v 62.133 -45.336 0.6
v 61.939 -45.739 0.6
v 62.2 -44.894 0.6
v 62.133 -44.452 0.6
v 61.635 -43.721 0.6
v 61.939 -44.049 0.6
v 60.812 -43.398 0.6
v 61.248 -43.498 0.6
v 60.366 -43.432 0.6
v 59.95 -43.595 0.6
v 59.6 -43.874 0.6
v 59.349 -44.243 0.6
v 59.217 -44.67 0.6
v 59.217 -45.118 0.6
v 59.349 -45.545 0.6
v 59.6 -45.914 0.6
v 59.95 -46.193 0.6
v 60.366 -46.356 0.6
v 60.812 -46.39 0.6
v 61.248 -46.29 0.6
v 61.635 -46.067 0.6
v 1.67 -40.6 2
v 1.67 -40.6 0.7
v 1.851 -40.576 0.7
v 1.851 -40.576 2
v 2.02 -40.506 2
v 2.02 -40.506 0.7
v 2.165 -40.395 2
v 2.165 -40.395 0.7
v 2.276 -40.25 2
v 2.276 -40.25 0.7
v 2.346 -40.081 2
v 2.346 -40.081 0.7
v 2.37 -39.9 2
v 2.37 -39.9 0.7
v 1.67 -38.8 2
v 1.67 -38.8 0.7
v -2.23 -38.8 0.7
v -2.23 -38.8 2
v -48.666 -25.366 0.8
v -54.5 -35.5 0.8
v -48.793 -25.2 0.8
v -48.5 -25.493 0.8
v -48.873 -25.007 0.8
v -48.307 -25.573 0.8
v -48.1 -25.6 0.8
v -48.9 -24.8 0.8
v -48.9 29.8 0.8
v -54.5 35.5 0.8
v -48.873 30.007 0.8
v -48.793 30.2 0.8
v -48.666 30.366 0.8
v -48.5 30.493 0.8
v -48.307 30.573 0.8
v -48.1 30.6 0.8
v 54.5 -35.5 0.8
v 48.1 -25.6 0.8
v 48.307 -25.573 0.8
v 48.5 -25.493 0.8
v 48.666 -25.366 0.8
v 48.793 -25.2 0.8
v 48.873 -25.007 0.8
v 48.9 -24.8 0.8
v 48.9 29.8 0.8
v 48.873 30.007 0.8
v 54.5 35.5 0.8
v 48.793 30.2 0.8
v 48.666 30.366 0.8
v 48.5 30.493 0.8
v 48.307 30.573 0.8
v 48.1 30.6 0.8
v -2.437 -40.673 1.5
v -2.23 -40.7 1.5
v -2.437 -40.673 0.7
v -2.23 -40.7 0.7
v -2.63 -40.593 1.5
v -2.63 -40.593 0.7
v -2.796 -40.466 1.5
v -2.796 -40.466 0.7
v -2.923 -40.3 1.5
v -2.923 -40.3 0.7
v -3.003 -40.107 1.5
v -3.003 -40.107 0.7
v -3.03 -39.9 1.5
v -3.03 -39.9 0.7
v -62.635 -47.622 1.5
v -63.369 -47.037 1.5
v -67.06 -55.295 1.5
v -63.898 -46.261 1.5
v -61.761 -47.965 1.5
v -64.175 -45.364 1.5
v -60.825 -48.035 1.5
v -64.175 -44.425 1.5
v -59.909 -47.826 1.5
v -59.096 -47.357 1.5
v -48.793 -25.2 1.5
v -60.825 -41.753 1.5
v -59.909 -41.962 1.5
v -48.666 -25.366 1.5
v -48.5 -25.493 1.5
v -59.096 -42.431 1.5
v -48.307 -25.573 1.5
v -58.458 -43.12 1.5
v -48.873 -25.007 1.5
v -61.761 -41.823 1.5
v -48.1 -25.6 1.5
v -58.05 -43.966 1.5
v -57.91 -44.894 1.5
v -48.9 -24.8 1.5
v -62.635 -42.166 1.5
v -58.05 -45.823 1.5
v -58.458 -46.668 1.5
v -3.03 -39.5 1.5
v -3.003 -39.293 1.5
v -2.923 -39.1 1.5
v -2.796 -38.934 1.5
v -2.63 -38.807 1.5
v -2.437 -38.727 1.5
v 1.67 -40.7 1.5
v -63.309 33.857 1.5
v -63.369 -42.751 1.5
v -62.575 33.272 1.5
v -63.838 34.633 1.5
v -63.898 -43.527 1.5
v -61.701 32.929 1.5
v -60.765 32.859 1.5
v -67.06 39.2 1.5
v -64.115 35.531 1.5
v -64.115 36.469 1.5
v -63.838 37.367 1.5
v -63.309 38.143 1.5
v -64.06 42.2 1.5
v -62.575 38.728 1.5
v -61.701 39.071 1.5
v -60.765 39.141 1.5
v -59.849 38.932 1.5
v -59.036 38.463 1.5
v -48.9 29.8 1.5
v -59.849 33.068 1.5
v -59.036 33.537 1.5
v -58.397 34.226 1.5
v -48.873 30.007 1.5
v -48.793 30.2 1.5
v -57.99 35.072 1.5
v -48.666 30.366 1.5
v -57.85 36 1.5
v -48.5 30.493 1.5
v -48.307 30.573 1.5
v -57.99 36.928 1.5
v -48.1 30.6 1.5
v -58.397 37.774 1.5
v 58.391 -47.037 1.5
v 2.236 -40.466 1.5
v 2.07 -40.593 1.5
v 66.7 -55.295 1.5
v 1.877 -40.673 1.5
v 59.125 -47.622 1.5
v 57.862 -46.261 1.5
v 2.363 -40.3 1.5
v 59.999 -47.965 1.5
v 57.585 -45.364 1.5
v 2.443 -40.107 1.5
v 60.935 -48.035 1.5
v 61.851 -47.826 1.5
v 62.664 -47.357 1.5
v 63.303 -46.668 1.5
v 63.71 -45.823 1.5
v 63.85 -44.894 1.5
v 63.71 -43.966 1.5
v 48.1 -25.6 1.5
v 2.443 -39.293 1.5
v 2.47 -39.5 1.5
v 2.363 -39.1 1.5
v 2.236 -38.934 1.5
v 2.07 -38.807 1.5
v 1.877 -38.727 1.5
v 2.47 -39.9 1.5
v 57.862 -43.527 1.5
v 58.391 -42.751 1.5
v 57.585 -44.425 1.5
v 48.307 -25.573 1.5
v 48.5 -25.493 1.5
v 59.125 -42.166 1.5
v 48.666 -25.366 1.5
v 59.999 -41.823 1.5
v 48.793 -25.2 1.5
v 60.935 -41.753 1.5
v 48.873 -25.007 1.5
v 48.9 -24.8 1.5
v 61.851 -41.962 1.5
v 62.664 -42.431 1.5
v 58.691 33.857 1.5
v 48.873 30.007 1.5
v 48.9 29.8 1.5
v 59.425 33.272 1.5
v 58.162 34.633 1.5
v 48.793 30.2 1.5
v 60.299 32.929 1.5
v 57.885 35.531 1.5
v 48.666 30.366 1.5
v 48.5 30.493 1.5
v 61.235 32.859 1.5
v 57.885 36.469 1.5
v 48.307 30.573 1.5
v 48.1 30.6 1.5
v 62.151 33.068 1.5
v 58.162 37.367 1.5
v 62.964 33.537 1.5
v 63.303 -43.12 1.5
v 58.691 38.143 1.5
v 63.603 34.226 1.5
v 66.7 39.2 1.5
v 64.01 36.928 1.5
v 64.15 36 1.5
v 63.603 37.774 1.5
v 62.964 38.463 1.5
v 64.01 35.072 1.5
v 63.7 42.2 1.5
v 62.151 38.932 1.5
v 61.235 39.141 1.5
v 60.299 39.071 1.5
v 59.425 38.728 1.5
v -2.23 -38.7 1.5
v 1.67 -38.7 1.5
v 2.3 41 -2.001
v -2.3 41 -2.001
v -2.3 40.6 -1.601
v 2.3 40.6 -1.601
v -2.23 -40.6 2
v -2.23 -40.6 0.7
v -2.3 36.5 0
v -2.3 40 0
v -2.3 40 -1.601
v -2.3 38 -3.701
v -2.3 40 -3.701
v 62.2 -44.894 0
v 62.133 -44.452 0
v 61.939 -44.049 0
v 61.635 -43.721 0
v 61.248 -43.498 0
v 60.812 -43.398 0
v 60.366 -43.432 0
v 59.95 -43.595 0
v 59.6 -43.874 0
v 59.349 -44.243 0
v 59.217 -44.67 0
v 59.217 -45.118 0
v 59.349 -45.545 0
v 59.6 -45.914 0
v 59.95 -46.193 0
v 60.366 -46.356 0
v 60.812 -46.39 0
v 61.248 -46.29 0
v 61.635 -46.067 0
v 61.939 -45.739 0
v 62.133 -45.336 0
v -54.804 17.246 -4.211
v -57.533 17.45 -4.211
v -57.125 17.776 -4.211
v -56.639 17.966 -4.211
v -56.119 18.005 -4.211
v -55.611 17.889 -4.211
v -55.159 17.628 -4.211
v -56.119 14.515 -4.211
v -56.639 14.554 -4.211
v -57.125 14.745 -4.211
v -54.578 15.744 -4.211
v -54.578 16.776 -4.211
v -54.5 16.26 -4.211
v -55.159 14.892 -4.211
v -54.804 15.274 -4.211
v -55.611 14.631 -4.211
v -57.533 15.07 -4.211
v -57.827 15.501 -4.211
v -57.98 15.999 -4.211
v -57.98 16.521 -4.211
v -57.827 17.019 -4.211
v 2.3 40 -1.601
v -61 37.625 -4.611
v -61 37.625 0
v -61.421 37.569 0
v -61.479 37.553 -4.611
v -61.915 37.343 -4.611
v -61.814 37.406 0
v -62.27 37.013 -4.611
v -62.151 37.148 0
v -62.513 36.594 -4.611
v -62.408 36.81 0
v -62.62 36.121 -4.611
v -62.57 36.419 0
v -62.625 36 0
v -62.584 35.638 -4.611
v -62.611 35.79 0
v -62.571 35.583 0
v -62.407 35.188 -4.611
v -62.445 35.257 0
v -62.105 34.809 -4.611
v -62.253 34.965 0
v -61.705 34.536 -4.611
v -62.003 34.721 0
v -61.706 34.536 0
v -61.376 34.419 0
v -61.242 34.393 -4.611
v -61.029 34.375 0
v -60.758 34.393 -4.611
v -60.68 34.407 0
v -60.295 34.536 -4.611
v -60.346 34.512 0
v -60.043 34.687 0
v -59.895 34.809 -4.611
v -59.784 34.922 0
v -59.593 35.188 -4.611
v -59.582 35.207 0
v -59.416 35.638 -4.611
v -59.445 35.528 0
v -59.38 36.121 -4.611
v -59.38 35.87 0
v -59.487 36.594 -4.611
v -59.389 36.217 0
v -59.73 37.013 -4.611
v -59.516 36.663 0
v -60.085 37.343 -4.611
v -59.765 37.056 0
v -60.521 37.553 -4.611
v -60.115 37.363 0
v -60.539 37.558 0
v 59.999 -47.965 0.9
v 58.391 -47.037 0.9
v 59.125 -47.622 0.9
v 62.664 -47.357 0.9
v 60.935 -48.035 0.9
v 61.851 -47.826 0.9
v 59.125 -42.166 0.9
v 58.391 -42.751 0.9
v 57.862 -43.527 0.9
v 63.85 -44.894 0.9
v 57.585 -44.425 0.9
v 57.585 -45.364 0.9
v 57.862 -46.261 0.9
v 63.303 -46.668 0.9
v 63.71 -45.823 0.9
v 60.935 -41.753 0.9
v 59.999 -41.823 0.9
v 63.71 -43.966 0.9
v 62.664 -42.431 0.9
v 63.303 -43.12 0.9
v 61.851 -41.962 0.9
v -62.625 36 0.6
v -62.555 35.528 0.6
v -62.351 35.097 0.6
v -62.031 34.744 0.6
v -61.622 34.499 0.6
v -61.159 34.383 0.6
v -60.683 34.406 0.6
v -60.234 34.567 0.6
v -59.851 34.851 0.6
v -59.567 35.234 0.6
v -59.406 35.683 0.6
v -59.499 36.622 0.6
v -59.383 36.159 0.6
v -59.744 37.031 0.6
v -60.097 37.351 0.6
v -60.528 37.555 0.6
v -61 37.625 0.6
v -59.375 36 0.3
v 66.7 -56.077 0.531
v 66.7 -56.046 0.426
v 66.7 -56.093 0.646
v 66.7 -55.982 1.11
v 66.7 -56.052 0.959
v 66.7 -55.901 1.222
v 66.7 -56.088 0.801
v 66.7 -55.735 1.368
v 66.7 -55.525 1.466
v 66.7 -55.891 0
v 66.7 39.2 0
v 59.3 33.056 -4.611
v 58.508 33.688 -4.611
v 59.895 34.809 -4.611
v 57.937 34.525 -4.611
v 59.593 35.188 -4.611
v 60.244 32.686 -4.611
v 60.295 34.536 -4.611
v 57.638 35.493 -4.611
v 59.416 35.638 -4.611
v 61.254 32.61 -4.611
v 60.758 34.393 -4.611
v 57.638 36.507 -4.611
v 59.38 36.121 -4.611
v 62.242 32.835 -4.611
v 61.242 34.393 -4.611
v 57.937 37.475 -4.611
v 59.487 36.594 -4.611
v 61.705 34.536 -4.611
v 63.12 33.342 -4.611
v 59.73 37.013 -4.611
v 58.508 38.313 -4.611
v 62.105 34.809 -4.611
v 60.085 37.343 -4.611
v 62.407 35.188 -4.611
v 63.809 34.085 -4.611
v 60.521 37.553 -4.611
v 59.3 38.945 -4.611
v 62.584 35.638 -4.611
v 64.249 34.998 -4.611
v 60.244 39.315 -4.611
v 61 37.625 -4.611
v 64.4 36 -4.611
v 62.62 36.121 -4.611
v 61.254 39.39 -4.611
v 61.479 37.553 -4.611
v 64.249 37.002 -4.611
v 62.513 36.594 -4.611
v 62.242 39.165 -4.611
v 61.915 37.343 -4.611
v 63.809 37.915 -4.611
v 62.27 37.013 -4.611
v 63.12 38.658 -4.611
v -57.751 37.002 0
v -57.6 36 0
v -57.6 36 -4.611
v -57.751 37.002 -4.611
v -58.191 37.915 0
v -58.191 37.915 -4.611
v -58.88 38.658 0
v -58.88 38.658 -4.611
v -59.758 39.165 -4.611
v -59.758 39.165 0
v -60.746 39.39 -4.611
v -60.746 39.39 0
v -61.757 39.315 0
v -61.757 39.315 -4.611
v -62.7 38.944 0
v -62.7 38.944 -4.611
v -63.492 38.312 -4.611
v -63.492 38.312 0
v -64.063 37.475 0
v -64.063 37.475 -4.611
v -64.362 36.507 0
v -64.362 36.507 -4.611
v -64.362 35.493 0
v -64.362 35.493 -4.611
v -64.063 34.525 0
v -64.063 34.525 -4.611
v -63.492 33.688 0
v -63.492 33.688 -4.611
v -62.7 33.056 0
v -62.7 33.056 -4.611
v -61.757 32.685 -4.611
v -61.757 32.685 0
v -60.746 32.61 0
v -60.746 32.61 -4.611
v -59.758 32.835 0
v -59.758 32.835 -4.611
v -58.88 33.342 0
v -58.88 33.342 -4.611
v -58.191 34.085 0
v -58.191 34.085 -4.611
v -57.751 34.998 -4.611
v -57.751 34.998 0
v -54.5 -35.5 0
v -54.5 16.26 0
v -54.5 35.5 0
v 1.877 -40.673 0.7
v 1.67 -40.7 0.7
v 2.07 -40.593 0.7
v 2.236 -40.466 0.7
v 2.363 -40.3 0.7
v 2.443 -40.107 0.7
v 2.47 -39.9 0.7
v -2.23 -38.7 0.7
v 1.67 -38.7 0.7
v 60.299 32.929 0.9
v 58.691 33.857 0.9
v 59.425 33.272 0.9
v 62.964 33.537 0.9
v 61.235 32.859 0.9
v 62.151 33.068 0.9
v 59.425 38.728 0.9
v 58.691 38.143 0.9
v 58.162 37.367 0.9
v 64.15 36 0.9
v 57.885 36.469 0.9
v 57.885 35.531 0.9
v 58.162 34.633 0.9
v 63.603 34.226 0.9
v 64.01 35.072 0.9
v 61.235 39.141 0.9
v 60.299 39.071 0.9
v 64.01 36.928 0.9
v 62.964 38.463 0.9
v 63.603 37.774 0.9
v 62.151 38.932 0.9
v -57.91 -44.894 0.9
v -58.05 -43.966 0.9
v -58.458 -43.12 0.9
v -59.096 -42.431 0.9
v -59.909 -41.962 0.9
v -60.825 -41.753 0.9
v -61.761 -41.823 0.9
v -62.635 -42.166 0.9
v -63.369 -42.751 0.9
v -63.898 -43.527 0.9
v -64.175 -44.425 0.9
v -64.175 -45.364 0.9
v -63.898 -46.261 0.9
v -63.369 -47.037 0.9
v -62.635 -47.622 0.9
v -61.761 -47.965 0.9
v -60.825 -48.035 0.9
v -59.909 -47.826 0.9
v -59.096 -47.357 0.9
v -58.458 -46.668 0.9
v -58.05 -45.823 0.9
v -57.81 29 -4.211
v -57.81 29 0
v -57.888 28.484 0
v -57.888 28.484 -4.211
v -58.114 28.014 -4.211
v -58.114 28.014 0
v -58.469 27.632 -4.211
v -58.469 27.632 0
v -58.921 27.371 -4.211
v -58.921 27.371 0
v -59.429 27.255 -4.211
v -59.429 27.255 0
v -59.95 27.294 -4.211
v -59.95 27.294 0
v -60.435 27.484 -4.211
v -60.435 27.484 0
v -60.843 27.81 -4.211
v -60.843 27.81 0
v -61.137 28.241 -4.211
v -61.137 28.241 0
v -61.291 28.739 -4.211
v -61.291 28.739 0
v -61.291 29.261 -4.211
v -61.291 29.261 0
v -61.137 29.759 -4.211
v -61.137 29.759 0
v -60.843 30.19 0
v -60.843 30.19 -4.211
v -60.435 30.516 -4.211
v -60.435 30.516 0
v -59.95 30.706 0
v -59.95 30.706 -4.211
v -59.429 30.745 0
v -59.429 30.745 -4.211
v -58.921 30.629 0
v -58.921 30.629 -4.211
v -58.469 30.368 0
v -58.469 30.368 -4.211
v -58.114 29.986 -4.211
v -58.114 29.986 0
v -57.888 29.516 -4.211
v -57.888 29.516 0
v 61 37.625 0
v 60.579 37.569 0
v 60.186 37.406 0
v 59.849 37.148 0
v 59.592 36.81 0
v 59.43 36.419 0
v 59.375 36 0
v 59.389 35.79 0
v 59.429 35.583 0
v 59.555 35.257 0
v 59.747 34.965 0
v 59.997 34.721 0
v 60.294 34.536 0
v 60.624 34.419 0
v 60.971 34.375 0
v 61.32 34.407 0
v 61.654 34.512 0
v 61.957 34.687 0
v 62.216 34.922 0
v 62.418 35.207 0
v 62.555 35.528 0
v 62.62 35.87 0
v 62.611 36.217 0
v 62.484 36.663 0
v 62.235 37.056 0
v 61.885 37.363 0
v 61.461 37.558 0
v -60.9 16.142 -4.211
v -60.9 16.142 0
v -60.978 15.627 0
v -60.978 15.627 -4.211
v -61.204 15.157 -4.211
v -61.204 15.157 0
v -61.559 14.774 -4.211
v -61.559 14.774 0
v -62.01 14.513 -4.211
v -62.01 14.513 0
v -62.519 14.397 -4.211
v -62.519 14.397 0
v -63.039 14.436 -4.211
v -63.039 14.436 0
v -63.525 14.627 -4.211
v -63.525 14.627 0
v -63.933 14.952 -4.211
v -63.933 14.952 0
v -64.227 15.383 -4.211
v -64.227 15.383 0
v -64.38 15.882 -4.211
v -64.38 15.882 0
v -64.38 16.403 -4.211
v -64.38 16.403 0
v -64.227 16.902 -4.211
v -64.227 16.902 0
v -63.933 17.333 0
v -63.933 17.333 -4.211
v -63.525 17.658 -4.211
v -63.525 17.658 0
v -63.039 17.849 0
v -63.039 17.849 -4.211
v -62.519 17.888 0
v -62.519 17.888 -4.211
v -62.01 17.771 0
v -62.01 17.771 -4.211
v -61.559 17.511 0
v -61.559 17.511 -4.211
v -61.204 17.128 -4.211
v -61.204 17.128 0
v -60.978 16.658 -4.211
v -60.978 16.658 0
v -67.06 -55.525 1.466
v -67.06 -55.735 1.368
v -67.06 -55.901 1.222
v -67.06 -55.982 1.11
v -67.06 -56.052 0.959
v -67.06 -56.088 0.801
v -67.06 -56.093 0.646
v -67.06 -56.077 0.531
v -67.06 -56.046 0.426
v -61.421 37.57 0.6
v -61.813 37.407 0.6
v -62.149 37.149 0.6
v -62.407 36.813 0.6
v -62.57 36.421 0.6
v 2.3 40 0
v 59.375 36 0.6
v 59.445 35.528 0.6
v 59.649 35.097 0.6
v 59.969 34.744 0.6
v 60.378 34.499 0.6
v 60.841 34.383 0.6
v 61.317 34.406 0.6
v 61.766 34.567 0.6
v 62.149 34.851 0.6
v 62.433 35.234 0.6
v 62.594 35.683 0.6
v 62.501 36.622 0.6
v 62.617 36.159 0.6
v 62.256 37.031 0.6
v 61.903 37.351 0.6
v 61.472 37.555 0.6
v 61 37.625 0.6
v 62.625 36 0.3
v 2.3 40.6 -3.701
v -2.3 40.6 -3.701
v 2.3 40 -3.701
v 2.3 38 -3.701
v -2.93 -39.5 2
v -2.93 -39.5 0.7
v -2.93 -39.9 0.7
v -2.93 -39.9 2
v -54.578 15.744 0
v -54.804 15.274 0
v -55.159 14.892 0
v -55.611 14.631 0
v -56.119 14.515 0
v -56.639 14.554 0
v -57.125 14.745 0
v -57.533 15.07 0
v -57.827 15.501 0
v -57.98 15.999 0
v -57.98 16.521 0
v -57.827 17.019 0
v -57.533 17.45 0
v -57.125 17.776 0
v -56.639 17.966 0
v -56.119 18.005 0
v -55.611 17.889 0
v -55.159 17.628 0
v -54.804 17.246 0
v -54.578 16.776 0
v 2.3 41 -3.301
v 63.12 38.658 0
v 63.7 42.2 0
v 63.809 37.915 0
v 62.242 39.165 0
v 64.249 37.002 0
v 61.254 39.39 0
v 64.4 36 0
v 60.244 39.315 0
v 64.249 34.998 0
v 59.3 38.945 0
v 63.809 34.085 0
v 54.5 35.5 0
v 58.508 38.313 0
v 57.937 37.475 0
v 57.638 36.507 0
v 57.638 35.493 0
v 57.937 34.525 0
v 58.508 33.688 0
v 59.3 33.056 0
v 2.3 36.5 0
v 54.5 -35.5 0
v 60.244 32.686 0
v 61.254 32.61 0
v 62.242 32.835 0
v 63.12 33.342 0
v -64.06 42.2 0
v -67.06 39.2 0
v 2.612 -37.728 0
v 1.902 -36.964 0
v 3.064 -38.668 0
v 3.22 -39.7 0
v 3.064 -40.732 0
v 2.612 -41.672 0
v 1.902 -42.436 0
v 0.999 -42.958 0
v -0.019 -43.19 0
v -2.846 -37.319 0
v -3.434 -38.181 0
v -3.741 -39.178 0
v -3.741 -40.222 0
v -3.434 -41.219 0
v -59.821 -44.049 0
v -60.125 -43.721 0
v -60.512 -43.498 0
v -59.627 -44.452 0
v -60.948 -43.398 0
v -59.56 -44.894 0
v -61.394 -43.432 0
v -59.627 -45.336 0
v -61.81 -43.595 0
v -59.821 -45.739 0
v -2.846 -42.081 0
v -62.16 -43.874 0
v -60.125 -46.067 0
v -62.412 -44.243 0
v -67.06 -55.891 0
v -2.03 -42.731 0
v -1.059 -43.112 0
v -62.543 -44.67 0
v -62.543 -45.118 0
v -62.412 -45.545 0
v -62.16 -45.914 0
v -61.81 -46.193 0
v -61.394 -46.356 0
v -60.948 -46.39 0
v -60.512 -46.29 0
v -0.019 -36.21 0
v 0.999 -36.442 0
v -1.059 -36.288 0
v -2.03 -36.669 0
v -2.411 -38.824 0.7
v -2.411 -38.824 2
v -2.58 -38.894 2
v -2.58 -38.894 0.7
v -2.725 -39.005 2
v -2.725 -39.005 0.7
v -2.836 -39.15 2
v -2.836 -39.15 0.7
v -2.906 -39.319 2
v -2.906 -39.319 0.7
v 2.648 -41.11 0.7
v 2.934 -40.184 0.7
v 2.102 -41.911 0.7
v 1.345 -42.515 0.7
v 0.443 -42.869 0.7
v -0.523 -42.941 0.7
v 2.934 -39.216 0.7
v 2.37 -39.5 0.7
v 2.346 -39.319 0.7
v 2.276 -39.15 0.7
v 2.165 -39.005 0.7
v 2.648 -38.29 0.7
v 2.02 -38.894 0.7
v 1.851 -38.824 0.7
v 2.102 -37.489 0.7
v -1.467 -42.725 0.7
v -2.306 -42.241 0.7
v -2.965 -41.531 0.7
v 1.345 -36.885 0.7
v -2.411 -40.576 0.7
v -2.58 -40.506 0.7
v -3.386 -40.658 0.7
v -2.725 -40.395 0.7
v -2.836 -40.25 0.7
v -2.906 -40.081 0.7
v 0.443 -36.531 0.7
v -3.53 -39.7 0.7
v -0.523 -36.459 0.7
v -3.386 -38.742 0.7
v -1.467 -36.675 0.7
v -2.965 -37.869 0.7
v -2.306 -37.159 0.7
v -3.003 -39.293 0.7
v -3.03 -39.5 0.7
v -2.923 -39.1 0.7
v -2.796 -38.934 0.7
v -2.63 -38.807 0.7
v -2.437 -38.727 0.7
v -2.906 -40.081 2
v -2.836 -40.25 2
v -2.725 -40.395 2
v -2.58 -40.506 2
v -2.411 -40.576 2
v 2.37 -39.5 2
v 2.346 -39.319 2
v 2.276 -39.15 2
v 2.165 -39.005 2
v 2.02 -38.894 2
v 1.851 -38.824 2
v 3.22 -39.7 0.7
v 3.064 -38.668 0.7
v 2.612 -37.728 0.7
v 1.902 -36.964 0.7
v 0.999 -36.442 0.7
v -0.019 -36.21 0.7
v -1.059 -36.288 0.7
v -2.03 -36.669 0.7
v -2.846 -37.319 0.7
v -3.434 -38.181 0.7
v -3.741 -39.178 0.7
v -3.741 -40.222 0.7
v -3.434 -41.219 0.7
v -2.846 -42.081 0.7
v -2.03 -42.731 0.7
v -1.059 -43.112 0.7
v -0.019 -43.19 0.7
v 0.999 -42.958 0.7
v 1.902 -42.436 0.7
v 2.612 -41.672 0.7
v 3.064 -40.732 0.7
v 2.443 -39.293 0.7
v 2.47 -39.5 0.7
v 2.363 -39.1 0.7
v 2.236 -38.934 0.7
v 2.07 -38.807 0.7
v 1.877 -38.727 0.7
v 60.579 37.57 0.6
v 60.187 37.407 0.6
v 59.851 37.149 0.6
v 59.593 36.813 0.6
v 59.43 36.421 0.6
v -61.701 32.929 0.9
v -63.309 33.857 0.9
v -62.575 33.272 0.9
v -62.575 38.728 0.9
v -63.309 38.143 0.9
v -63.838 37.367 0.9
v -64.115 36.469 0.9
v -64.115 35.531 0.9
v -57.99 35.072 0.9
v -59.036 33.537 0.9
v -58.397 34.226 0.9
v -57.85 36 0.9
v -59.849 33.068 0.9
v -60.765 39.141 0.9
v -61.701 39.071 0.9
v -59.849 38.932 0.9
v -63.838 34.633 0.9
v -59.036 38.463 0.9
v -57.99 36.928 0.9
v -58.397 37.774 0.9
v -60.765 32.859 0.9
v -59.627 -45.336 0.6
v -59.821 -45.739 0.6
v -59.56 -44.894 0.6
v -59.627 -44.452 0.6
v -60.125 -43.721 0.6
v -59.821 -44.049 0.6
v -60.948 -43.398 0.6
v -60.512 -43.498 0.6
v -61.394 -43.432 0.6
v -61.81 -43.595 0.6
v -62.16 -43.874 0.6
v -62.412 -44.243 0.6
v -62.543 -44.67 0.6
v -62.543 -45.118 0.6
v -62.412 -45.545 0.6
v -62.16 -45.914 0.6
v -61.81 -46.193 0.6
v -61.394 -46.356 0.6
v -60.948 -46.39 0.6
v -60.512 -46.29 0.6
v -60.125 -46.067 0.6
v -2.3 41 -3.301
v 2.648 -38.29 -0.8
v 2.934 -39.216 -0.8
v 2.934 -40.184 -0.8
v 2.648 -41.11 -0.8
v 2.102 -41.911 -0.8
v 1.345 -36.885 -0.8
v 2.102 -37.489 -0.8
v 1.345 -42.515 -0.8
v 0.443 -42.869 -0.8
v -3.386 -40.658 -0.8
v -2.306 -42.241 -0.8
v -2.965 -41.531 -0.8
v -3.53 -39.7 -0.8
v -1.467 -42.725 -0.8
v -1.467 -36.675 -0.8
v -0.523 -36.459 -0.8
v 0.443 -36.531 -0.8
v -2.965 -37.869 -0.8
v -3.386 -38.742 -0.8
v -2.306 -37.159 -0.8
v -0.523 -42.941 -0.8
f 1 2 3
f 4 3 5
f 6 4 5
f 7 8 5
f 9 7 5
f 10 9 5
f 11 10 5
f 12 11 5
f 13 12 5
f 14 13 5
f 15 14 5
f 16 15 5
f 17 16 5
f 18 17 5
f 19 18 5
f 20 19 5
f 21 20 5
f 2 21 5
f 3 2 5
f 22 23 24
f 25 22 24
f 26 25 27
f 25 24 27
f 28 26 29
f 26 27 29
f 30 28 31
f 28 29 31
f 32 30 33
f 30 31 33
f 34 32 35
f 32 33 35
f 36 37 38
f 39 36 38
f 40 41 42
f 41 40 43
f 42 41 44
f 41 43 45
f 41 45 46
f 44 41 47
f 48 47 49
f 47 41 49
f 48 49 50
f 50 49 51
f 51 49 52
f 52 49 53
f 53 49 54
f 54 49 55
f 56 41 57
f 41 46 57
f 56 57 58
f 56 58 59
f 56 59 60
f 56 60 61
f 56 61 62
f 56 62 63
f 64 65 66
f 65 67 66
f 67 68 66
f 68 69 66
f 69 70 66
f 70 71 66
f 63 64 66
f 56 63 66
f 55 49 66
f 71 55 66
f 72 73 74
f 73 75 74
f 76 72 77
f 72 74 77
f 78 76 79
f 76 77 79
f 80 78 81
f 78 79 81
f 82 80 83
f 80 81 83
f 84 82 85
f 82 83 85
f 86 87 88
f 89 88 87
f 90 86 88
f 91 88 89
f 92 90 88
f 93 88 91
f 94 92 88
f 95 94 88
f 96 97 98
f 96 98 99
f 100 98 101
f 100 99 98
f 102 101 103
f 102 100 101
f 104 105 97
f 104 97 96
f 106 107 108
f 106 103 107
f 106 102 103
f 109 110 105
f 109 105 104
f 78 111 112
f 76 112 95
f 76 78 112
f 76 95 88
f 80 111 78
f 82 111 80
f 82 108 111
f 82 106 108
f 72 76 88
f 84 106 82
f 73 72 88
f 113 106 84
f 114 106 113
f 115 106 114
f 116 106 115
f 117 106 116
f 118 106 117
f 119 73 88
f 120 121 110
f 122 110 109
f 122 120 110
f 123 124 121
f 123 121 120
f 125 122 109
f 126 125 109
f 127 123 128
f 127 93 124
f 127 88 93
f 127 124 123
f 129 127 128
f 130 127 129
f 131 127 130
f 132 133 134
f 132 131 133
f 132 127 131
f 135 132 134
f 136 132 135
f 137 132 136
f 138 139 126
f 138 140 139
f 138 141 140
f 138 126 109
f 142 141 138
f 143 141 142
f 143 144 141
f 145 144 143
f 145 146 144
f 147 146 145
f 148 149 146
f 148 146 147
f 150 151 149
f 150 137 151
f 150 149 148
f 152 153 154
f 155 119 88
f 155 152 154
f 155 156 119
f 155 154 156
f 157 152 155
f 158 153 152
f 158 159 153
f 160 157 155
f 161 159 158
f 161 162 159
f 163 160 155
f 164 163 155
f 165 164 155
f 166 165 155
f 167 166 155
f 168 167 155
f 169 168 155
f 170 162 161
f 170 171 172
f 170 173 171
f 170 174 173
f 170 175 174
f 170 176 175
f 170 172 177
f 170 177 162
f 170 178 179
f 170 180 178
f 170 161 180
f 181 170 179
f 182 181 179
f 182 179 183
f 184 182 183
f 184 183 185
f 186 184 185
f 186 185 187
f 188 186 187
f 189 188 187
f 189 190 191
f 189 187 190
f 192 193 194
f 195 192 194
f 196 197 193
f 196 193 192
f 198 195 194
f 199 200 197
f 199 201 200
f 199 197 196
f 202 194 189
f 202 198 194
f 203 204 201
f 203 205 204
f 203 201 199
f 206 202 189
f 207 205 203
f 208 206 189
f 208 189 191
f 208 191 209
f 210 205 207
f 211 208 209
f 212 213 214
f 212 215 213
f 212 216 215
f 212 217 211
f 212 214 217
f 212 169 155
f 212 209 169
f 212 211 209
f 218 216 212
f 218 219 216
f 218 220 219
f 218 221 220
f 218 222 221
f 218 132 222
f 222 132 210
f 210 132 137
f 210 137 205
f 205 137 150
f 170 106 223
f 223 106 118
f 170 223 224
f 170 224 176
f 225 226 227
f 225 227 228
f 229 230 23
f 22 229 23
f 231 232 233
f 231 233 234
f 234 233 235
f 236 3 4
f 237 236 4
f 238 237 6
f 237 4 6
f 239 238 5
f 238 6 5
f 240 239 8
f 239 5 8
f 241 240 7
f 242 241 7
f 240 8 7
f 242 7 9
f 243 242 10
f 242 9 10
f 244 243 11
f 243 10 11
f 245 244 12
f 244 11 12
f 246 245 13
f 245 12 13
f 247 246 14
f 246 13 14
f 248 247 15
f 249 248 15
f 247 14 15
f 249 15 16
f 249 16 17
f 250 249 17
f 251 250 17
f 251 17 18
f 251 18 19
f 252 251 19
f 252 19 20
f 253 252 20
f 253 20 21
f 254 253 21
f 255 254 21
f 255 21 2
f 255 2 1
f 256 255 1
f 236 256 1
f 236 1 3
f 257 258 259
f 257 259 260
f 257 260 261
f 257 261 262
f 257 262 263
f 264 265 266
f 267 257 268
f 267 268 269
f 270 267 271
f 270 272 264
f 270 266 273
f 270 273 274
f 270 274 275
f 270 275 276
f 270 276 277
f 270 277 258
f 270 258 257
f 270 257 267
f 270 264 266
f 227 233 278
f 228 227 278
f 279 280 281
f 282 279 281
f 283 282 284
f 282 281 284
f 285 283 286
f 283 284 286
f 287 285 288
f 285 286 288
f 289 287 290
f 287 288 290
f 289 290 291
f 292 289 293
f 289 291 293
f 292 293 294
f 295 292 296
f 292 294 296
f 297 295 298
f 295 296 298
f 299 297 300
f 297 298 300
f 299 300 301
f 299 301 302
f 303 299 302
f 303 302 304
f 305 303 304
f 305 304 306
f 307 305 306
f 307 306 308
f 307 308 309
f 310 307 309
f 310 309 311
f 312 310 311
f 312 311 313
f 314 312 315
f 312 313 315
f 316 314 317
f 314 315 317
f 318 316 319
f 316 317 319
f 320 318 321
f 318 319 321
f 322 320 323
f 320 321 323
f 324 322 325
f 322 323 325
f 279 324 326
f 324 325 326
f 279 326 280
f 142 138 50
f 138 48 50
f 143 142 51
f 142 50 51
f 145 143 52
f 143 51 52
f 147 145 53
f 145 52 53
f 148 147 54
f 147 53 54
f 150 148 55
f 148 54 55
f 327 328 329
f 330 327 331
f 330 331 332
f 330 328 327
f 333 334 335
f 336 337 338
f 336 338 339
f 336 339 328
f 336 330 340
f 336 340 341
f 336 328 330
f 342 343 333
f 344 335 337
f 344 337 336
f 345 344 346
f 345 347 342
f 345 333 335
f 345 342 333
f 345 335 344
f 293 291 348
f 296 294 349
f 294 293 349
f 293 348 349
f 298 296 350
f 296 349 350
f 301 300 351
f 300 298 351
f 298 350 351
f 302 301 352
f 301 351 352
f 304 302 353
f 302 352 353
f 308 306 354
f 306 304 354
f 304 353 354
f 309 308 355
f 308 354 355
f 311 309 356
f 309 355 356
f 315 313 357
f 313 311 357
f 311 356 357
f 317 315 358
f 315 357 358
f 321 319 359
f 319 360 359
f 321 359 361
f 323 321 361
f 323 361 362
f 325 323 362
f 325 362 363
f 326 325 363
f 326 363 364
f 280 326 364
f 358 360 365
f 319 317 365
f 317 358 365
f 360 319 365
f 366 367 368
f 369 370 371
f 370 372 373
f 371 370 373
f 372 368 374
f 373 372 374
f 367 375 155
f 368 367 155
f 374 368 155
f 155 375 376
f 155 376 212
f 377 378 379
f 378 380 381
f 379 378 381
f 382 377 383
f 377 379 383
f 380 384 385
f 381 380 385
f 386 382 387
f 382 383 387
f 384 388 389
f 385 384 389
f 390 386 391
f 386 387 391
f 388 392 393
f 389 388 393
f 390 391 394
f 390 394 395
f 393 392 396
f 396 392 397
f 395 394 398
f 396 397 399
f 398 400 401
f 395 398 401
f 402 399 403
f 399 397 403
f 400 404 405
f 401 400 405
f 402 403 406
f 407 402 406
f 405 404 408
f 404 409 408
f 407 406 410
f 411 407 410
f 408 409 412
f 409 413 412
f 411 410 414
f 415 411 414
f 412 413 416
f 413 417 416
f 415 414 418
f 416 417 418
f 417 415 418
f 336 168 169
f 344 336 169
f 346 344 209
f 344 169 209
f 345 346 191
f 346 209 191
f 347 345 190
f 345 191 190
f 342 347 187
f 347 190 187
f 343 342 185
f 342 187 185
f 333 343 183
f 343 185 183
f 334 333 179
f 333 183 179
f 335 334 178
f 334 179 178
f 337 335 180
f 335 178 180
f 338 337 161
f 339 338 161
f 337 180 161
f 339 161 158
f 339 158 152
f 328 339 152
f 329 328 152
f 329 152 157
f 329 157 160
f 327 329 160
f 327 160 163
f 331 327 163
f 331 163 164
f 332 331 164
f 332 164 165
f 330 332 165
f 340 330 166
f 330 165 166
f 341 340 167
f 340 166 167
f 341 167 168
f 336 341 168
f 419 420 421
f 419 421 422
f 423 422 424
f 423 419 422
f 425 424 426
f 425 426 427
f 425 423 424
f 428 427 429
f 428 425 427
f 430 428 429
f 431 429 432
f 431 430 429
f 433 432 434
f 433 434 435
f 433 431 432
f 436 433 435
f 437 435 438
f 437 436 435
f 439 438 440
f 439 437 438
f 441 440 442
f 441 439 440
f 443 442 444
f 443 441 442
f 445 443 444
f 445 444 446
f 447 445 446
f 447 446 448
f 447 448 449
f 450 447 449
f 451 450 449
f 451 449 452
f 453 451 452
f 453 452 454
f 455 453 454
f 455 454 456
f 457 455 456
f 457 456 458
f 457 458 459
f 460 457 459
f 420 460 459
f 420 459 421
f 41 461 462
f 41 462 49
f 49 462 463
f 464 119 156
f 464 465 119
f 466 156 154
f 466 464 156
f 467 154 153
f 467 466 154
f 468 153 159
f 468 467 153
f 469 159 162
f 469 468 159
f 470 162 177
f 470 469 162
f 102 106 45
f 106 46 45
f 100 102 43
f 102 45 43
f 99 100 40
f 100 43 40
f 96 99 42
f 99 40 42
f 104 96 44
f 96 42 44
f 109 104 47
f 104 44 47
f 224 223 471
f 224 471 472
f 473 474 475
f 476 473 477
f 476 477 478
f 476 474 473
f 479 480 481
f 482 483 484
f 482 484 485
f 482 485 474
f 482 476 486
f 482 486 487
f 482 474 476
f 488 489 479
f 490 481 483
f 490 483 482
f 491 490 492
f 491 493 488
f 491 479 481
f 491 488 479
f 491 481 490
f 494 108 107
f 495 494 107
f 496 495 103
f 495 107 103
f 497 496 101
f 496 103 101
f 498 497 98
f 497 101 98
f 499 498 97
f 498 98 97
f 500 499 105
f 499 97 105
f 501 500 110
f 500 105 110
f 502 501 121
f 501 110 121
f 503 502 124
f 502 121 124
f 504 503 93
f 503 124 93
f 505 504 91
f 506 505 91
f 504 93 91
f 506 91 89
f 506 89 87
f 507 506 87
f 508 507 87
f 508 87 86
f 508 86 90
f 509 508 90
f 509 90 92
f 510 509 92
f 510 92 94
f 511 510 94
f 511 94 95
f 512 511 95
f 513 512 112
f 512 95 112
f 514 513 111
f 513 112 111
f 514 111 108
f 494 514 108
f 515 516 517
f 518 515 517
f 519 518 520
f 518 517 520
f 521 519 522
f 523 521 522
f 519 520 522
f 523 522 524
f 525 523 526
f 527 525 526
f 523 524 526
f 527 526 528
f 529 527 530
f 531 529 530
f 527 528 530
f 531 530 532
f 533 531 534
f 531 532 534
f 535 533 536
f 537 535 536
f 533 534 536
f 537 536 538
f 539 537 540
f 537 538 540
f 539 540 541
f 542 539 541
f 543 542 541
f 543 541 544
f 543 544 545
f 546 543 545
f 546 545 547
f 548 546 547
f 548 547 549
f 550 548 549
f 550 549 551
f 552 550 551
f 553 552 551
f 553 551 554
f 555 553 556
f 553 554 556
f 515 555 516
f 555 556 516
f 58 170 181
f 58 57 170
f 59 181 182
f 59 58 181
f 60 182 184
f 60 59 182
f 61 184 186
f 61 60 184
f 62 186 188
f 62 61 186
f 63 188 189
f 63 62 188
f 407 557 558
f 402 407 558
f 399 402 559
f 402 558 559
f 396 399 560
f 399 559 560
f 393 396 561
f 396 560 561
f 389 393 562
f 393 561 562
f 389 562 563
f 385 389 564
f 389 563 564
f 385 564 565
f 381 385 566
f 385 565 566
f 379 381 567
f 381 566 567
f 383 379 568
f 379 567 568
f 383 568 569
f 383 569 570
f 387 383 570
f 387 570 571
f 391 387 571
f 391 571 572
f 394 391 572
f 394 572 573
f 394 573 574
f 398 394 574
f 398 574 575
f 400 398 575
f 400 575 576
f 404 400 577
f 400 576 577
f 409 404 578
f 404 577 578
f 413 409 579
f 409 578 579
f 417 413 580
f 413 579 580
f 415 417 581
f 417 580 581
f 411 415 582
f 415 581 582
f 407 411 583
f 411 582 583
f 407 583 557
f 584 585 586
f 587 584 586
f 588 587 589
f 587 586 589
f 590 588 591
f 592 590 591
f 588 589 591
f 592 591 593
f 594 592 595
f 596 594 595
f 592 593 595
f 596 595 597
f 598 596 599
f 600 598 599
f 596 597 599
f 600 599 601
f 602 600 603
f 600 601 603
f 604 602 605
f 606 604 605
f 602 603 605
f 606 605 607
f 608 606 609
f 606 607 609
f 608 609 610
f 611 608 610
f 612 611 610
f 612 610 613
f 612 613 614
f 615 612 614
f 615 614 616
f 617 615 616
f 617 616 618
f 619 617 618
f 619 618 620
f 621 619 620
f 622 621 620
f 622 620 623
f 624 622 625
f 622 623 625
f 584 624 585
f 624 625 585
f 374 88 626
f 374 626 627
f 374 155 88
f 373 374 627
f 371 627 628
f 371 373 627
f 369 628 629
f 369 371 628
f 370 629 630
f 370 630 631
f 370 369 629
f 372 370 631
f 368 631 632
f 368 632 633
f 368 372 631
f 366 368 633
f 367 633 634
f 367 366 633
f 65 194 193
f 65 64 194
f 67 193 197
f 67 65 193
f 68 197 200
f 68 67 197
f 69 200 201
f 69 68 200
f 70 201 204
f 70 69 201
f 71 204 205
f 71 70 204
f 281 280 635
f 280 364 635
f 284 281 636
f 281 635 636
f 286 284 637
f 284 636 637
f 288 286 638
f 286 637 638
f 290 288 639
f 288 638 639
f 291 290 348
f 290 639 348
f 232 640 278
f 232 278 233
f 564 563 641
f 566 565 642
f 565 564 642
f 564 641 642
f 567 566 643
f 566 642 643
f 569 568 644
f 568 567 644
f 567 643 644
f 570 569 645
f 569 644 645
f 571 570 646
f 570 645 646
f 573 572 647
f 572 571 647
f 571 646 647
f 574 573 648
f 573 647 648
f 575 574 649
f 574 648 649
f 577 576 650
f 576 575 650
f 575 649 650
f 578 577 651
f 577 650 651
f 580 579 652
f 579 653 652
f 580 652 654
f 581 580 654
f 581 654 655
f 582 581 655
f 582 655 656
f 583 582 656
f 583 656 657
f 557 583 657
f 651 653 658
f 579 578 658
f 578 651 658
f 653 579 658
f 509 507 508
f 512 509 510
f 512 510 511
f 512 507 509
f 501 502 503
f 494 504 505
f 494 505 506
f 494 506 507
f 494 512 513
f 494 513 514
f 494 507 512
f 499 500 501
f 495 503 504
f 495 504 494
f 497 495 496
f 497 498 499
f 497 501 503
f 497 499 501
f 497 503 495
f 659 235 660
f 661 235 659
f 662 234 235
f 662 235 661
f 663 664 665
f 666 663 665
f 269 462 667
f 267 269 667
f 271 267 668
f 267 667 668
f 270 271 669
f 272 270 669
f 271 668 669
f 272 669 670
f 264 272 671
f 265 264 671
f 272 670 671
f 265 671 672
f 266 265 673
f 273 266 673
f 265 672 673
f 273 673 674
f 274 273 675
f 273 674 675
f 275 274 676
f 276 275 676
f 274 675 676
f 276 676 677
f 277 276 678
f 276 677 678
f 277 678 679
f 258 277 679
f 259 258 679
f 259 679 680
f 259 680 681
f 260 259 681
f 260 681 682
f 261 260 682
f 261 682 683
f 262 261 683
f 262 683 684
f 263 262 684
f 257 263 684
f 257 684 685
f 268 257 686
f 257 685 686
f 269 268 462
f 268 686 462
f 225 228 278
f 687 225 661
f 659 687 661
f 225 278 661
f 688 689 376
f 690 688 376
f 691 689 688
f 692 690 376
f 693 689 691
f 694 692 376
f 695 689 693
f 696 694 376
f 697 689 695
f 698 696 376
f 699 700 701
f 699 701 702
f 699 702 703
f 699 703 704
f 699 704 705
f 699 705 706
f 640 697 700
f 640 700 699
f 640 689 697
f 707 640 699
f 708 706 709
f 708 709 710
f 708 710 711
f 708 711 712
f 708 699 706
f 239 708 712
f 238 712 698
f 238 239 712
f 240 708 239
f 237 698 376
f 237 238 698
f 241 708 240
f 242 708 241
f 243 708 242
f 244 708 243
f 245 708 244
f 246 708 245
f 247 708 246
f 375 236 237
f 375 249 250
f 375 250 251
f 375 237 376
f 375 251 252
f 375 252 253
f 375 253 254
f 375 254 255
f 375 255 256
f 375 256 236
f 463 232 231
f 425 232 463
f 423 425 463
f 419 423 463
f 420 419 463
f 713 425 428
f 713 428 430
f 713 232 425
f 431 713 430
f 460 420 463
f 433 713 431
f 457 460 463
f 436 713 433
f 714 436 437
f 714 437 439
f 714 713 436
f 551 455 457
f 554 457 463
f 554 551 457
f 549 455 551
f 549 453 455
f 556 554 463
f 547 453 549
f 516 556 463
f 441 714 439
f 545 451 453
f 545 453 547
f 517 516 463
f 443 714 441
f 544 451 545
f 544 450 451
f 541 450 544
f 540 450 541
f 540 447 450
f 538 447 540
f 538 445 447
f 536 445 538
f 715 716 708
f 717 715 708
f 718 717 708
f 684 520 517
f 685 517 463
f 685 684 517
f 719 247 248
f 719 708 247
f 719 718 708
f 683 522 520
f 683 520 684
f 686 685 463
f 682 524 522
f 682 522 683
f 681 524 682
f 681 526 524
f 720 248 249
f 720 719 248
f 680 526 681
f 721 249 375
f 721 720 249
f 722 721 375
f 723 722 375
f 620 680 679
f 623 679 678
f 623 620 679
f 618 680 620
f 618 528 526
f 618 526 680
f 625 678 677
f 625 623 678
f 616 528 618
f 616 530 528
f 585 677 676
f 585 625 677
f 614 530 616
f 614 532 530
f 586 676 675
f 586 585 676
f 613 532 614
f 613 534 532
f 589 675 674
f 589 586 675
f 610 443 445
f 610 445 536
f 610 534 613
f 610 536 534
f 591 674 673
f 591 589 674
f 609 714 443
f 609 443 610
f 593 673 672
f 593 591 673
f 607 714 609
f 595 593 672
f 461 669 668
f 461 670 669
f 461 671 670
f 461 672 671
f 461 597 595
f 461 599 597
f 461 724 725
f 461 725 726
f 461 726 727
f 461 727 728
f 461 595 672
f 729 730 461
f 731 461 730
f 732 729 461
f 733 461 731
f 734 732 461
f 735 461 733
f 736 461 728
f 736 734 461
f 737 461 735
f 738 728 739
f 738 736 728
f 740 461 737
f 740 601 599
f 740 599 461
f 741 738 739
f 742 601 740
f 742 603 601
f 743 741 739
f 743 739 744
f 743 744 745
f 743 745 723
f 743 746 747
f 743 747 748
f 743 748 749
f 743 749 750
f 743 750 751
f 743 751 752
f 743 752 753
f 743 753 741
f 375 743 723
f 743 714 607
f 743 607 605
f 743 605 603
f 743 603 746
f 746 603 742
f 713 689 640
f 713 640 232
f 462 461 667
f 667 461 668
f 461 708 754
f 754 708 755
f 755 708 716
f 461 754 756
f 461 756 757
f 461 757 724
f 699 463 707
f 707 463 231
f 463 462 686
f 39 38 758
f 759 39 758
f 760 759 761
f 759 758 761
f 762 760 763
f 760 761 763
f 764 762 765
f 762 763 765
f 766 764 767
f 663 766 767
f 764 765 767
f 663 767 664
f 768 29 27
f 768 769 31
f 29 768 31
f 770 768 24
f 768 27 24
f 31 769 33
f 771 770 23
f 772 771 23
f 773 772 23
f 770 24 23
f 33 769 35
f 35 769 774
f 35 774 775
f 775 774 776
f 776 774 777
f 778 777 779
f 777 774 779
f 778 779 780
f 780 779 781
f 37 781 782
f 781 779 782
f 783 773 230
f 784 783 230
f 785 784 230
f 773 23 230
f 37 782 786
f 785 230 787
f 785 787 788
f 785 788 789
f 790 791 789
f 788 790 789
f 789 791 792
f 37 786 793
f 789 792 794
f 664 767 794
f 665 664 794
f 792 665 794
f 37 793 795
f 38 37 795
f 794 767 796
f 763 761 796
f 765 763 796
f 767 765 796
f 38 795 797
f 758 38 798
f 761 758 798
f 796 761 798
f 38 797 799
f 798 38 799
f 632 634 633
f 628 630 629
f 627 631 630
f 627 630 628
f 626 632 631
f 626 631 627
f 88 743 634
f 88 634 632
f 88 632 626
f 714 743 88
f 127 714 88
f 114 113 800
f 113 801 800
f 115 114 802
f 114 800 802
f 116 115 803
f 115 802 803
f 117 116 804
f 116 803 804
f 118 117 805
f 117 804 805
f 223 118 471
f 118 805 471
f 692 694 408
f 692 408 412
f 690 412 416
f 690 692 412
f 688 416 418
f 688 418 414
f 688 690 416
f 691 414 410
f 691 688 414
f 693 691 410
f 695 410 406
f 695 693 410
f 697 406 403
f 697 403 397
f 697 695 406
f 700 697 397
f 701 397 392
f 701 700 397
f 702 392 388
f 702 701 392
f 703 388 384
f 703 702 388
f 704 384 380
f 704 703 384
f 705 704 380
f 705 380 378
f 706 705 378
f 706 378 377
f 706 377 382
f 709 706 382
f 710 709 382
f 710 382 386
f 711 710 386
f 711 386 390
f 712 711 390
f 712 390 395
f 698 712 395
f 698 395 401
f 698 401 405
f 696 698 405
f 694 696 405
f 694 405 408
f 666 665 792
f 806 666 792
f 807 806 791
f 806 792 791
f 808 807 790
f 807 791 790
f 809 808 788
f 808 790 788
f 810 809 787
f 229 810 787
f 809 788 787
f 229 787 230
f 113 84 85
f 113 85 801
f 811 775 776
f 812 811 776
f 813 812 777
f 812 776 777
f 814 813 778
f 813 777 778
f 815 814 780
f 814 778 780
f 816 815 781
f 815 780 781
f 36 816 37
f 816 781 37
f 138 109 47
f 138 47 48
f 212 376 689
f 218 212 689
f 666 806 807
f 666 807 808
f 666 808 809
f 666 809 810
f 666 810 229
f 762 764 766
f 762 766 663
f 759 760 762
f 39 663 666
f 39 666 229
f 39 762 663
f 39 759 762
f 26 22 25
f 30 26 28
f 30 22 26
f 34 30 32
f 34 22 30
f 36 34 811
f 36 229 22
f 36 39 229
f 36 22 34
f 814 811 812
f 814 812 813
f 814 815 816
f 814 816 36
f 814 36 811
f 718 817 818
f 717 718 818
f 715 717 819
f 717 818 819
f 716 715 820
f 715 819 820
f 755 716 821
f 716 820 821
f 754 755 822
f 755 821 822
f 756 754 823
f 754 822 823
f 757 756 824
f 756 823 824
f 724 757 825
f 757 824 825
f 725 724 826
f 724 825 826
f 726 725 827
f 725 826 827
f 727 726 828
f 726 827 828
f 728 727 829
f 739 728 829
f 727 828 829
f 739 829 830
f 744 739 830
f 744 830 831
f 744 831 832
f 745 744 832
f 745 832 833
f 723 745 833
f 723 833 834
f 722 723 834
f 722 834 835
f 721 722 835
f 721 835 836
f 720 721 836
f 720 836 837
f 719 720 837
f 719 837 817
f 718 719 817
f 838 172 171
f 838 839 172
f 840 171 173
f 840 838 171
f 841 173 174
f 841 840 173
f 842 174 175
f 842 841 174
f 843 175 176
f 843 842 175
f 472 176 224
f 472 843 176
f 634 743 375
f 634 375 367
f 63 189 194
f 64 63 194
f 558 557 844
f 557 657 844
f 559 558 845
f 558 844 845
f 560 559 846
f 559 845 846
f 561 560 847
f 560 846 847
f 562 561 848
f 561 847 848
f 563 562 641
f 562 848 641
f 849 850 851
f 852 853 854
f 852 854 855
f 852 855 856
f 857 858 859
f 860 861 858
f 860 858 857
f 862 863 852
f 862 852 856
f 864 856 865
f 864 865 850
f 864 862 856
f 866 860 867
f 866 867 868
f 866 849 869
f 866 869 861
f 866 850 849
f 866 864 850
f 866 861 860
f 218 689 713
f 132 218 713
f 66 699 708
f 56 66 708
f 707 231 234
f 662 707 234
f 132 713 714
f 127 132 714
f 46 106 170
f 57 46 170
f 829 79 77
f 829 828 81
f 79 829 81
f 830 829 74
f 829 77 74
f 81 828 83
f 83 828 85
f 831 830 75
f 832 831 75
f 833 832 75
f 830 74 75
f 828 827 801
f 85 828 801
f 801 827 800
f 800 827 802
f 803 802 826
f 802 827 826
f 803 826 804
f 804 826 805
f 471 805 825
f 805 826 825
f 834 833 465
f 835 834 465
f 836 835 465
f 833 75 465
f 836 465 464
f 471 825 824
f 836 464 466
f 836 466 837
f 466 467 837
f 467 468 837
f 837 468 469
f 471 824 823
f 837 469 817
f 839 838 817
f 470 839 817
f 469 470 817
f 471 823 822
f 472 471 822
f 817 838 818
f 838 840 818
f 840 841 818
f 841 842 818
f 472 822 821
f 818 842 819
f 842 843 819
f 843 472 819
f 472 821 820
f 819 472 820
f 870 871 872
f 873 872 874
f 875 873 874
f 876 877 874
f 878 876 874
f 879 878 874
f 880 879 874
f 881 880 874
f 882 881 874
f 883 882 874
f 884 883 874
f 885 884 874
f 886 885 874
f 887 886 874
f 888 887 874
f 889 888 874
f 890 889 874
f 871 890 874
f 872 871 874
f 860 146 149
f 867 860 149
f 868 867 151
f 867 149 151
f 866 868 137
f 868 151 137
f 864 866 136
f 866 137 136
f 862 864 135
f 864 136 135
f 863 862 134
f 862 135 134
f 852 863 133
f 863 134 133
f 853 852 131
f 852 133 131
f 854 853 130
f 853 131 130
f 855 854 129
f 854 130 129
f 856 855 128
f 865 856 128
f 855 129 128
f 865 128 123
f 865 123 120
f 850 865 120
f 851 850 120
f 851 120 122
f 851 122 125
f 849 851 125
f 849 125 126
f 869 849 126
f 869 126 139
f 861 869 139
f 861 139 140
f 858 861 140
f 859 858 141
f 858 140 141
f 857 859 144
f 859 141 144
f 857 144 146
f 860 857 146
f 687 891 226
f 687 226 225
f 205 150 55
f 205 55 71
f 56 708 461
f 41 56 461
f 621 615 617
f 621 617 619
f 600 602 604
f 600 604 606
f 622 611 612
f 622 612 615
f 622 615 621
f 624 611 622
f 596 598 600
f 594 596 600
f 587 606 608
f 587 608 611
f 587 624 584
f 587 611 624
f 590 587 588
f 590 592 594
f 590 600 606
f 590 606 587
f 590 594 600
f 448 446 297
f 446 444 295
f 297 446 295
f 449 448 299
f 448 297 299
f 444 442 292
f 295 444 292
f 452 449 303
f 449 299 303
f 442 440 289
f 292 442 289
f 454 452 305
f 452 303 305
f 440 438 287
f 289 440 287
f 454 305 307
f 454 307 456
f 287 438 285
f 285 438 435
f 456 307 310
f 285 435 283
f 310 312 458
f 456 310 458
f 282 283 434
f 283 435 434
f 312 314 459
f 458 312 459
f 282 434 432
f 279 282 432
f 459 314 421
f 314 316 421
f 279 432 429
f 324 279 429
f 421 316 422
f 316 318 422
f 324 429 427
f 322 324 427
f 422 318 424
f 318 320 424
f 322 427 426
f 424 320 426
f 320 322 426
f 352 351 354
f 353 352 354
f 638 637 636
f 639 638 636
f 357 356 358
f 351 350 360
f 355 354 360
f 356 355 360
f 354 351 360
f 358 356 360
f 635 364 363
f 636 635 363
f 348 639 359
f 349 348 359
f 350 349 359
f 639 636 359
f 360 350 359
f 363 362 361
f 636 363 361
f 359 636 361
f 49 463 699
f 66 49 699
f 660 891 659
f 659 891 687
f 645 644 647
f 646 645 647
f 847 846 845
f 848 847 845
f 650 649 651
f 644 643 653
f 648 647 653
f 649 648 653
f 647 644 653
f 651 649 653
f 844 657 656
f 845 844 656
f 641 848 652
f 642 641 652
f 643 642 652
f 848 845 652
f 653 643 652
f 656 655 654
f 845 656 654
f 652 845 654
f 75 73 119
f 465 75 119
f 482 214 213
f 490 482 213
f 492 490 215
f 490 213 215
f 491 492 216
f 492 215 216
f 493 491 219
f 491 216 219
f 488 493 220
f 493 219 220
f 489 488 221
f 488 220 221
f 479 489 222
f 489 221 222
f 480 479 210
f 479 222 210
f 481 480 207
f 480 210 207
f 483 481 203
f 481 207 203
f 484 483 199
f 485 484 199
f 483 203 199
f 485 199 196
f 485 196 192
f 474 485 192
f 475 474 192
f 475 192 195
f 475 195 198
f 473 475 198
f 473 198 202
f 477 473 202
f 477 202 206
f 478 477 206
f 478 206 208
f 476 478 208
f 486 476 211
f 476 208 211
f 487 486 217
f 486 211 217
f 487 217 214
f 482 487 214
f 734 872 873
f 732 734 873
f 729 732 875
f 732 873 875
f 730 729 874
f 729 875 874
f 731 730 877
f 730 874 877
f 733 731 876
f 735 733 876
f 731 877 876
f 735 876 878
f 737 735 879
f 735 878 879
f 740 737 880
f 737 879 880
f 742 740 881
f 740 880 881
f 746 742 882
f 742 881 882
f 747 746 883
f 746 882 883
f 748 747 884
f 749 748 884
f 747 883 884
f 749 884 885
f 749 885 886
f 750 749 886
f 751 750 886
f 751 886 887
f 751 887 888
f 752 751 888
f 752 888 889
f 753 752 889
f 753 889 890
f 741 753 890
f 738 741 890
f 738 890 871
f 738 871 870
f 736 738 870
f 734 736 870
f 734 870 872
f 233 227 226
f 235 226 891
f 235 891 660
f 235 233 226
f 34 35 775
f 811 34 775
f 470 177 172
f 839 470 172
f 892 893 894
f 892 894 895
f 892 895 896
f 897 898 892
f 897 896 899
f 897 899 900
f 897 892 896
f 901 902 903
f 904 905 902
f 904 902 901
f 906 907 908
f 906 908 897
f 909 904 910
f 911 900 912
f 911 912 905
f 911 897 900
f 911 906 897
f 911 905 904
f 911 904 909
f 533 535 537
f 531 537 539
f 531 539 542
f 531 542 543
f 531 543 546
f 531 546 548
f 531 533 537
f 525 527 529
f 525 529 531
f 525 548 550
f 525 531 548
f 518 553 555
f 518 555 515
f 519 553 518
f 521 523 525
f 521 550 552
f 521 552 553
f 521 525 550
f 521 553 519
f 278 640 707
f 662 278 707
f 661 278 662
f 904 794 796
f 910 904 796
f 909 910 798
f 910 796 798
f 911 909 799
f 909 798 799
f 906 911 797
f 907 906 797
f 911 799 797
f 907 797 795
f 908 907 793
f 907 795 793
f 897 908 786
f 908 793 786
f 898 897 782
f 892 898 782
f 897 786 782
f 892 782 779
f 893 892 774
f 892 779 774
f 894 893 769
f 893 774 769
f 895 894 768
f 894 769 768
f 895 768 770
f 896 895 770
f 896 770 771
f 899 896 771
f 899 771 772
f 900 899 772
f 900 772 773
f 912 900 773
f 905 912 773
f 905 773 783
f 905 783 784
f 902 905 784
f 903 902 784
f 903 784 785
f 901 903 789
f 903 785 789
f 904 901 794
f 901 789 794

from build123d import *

# Parameters (mm, degrees)
SKETCH1_W            = 99
SKETCH1_H            = 59
BOSS_EXTRUDE1_DEPTH  = 1.5
BOSS_EXTRUDE2_DEPTH  = 133.760231922
CUT_EXTRUDE1_DEPTH   = 0.8
SKETCH4_R            = 1.5
CUT_EXTRUDE2_DEPTH   = 2
SKETCH5_R            = 3.399812147
SKETCH5_R_2          = 1.62500056
BOSS_EXTRUDE3_DEPTH  = 6.111397409
SKETCH6_R            = 3.5
CUT_EXTRUDE5_DEPTH   = 10
SKETCH7_R            = 3.5
SKETCH7_W            = 5.5
SKETCH7_H            = 2
BOSS_EXTRUDE4_DEPTH  = 0.8
FILLET1_R            = 0.8
SKETCH8_R            = 3.25
BOSS_EXTRUDE5_DEPTH  = 1.5
BOSS_EXTRUDE6_DEPTH  = 1.3
SKETCH10_R           = 3.15
CUT_EXTRUDE6_DEPTH   = 0.6
SKETCH11_R           = 1.75
BOSS_EXTRUDE7_DEPTH  = 4.211398277
SKETCH12_R           = 1.62500056
SKETCH12_R_2         = 1.5
BOSS_EXTRUDE8_DEPTH  = 0.3
SKETCH13_W           = 99
SKETCH13_H           = 59
SKETCH13_W_2         = 97.8
SKETCH13_H_2         = 56.2
BOSS_EXTRUDE9_DEPTH  = 0.7
FILLET2_R            = 0.8
FILLET3_R            = 0.8
SKETCH14_W           = 4.6
SKETCH14_H           = 2
BOSS_EXTRUDE10_DEPTH = 3.700797235
SKETCH15_W           = 4.6
SKETCH15_H           = 2.100000097
BOSS_EXTRUDE11_DEPTH = 1
CHAMFER1_SIZE        = 0.4
BOSS_EXTRUDE12_DEPTH = 4.6


with BuildPart() as part:
    # Sketch1 → Boss-Extrude1 (new body)
    with BuildSketch(Plane.XY):
        Polygon((63.7, 42.199999637), (-64.060231922, 42.199999637), (-67.060231922, 39.199999637), (-67.060231922, -42.134474378), (-67.060231922, -55.300000363), (66.7, -55.300000363), (66.7, -42.134474378), (66.7, 39.199999637), align=None)
        with Locations((0, 2.5)):
            Rectangle(SKETCH1_W, SKETCH1_H, mode=Mode.SUBTRACT)
    extrude(amount=BOSS_EXTRUDE1_DEPTH)

    # Sketch2 → Boss-Extrude2 (add)
    with BuildSketch(Plane.ZY.offset(67.060231922)):
        Polygon((0, -55.89119006), (1.499999976, -56.437145477), (1.5, -55.300000363), (0, -55.300000363), align=None)
    extrude(amount=-BOSS_EXTRUDE2_DEPTH)

    # Sketch3 → Cut-Extrude1 (cut)
    with BuildSketch(Plane(origin=(0, 0, 0), x_dir=(-1, 0, 0), z_dir=(0, 0, -1))):
        Polygon((54.499870171, -35.499884466), (54.499876378, 35.500115534), (-54.500123622, 35.500125063), (-54.500129829, -35.499874937), align=None)
    extrude(amount=-CUT_EXTRUDE1_DEPTH, mode=Mode.SUBTRACT)

    # Sketch4 → Cut-Extrude2 (cut)
    with BuildSketch(Plane.XY.offset(1.5)):
        with Locations((60.7, -44.894025617)):
            Circle(SKETCH4_R)
        with Locations((-61.060231922, -44.894025617)):
            Circle(SKETCH4_R)
        with BuildLine():
            add(Edge.make_bspline(
                [(-62.62500256, 36.000001036), (-62.62500256, 32.749999916), (-59.37500144, 32.749999916), (-59.37500144, 36.000001036), (-59.37500144, 39.250002156), (-62.62500256, 39.250002156), (-62.62500256, 36.000001036)],
                knots=[0, 0, 0, 0, 0.5, 0.5, 0.5, 1, 1, 1, 1], degree=3, weights=[1, 0.333333333, 0.333333333, 1, 0.333333333, 0.333333333, 1]))
        make_face()
        with BuildLine():
            add(Edge.make_bspline(
                [(59.37499728, 36.000001036), (59.37499728, 32.749999916), (62.6249984, 32.749999916), (62.6249984, 36.000001036), (62.6249984, 39.250002156), (59.37499728, 39.250002156), (59.37499728, 36.000001036)],
                knots=[0, 0, 0, 0, 0.5, 0.5, 0.5, 1, 1, 1, 1], degree=3, weights=[1, 0.333333333, 0.333333333, 1, 0.333333333, 0.333333333, 1]))
        make_face()
    extrude(amount=-CUT_EXTRUDE2_DEPTH, mode=Mode.SUBTRACT)

    # Sketch5 → Boss-Extrude3 (add)
    # profile 1 of 2: a face of its own
    with BuildSketch(Plane.XY.offset(1.5)):
        with Locations((-61.000002, 36.000001036)):
            Circle(SKETCH5_R)
        with Locations(Location((-61.000002, 36.000001036, 0), (0, 0, 90))):
            Circle(SKETCH5_R_2, mode=Mode.SUBTRACT)
    # profile 2 of 2: a face of its own
    with BuildSketch(Plane.XY.offset(1.5)):
        with Locations((61.000187857, 36.000187857)):
            Circle(SKETCH5_R)
        with Locations(Location((60.99999784, 36.000001036, 0), (0, 0, 90))):
            Circle(SKETCH5_R_2, mode=Mode.SUBTRACT)
    extrude(amount=-BOSS_EXTRUDE3_DEPTH)

    # Sketch6 → Cut-Extrude5 (cut)
    with BuildSketch(Plane.XY.offset(1.5)):
        with Locations((-0.280115961, -39.700000383)):
            Circle(SKETCH6_R)
    extrude(amount=-CUT_EXTRUDE5_DEPTH, mode=Mode.SUBTRACT)

    # Sketch7 → Boss-Extrude4 (add)
    with BuildSketch(Plane.XY.offset(1.5)):
        with Locations((-0.280115961, -39.700000383)):
            Circle(SKETCH7_R)
        with Locations((-0.280115961, -39.700000383)):
            Rectangle(SKETCH7_W, SKETCH7_H, mode=Mode.SUBTRACT)
    extrude(amount=-BOSS_EXTRUDE4_DEPTH)

    # Fillet1
    fillet1_edges = [part.edges().sort_by_distance(p)[0] for p in [
        (2.469884039, -40.700000383, 1.1),
        (-3.030115961, -40.700000383, 1.1),
        (-3.030115961, -38.700000383, 1.1),
        (2.469884039, -38.700000383, 1.1),
    ]]
    fillet(fillet1_edges, radius=FILLET1_R)

    # Sketch10 → Cut-Extrude6 (cut)
    with BuildSketch(Plane.XY.offset(1.5)):
        with Locations((-61.000002, 36.000001036)):
            Circle(SKETCH10_R)
        with Locations((-61.060231922, -44.894025617)):
            Circle(SKETCH10_R)
        with Locations((60.7, -44.894025617)):
            Circle(SKETCH10_R)
        with Locations((60.99999784, 36.000001036)):
            Circle(SKETCH10_R)
    extrude(amount=-CUT_EXTRUDE6_DEPTH, mode=Mode.SUBTRACT)

    # Sketch11 → Boss-Extrude7 (add)
    with BuildSketch(Plane(origin=(0, 0, 0), x_dir=(-1, 0, 0), z_dir=(0, 0, -1))):
        with Locations(Location((62.649814147, 16.142402615, 0), (0, 0, 180))):
            Circle(SKETCH11_R)
        with Locations(Location((56.249874696, 16.260173458, 0), (0, 0, 179.999994991))):
            Circle(SKETCH11_R)
        with Locations(Location((59.560231922, 28.999999637, 0), (0, 0, 180))):
            Circle(SKETCH11_R)
    extrude(amount=BOSS_EXTRUDE7_DEPTH)

    # Sketch12 → Boss-Extrude8 (add)
    with BuildSketch(Plane.XY.offset(0.9)):
        with Locations((-61.000002, 36.000001036)):
            Circle(SKETCH12_R)
        with Locations((-61.060231922, -44.894025617)):
            Circle(SKETCH12_R_2)
        with Locations((60.99999784, 36.000001036)):
            Circle(SKETCH12_R)
        with Locations((60.7, -44.894025617)):
            Circle(SKETCH12_R_2)
    extrude(amount=-BOSS_EXTRUDE8_DEPTH)

    # Sketch13 → Boss-Extrude9 (add)
    with BuildSketch(Plane.XY.offset(1.5)):
        with Locations((0, 2.5)):
            Rectangle(SKETCH13_W, SKETCH13_H)
        with Locations((0, 2.5)):
            Rectangle(SKETCH13_W_2, SKETCH13_H_2, mode=Mode.SUBTRACT)
    extrude(amount=-BOSS_EXTRUDE9_DEPTH)

    # Fillet2
    fillet2_edges = [part.edges().sort_by_distance(p)[0] for p in [
        (48.9, -25.6, 1.15),
        (-48.9, -25.6, 1.15),
        (-48.9, 30.6, 1.15),
        (48.9, 30.6, 1.15),
    ]]
    fillet(fillet2_edges, radius=FILLET2_R)

    # Fillet3
    fillet3_edges = [part.edges().sort_by_distance(p)[0] for p in [
        (-0.180115961, -56.437145477, 1.499999976),
    ]]
    fillet(fillet3_edges, radius=FILLET3_R)

    # Sketch14 → Boss-Extrude10 (add)
    with BuildSketch(Plane(origin=(0, 0, 0), x_dir=(-1, 0, 0), z_dir=(0, 0, -1))):
        with Locations((0, 38.999999724)):
            Rectangle(SKETCH14_W, SKETCH14_H)
    extrude(amount=BOSS_EXTRUDE10_DEPTH)

    # Sketch15 → Boss-Extrude11 (add)
    with BuildSketch(Plane(origin=(0, 39.999999724, 0), x_dir=(1.0, 2.676820723074785e-12, 0), z_dir=(-2.676820723074785e-12, 1.0, 0))):
        with Locations((0, 2.650797187)):
            Rectangle(SKETCH15_W, SKETCH15_H)
    extrude(amount=BOSS_EXTRUDE11_DEPTH)

    # Chamfer1
    chamfer1_edges = [part.edges().sort_by_distance(p)[0] for p in [
        (0, 40.999999724, -3.700797235),
        (0, 40.999999724, -1.600797138),
    ]]
    chamfer(chamfer1_edges, length=CHAMFER1_SIZE)

    # Sketch16 → Boss-Extrude12 (add)
    with BuildSketch(Plane(origin=(2.3, 0, 0), x_dir=(0, 0, -1), z_dir=(1, 0, 0))):
        Polygon((3.700797322, 37.999999724), (0, 37.999999724), (0, 36.499999724), align=None)
    extrude(amount=-BOSS_EXTRUDE12_DEPTH)


with BuildPart() as body_2:
    # Sketch8 → Boss-Extrude5 (new body)
    with BuildSketch(Plane(origin=(0, 0, 0.7), x_dir=(-1, 0, 0), z_dir=(0, 0, -1))):
        with Locations((0.280115961, -39.700000383)):
            Circle(SKETCH8_R)
    extrude(amount=BOSS_EXTRUDE5_DEPTH)

    # Sketch9 → Boss-Extrude6 (add)
    with BuildSketch(Plane.XY.offset(0.7)):
        with BuildLine():
            Line((2.369884039, -39.900000383), (2.369884039, -39.500000383))
            ThreePointArc((2.369884039, -39.500000383), (2.164858786, -39.005025636), (1.669884039, -38.800000383))
            Line((1.669884039, -38.800000383), (-2.230115961, -38.800000383))
            ThreePointArc((-2.230115961, -38.800000383), (-2.725090708, -39.005025636), (-2.930115961, -39.500000383))
            Line((-2.930115961, -39.500000383), (-2.930115961, -39.900000383))
            ThreePointArc((-2.930115961, -39.900000383), (-2.725090708, -40.39497513), (-2.230115961, -40.600000383))
            Line((-2.230115961, -40.600000383), (1.669884039, -40.600000383))
            ThreePointArc((1.669884039, -40.600000383), (2.164858786, -40.39497513), (2.369884039, -39.900000383))
        make_face()
    extrude(amount=BOSS_EXTRUDE6_DEPTH)


solid = Compound([part.part, body_2.part])
